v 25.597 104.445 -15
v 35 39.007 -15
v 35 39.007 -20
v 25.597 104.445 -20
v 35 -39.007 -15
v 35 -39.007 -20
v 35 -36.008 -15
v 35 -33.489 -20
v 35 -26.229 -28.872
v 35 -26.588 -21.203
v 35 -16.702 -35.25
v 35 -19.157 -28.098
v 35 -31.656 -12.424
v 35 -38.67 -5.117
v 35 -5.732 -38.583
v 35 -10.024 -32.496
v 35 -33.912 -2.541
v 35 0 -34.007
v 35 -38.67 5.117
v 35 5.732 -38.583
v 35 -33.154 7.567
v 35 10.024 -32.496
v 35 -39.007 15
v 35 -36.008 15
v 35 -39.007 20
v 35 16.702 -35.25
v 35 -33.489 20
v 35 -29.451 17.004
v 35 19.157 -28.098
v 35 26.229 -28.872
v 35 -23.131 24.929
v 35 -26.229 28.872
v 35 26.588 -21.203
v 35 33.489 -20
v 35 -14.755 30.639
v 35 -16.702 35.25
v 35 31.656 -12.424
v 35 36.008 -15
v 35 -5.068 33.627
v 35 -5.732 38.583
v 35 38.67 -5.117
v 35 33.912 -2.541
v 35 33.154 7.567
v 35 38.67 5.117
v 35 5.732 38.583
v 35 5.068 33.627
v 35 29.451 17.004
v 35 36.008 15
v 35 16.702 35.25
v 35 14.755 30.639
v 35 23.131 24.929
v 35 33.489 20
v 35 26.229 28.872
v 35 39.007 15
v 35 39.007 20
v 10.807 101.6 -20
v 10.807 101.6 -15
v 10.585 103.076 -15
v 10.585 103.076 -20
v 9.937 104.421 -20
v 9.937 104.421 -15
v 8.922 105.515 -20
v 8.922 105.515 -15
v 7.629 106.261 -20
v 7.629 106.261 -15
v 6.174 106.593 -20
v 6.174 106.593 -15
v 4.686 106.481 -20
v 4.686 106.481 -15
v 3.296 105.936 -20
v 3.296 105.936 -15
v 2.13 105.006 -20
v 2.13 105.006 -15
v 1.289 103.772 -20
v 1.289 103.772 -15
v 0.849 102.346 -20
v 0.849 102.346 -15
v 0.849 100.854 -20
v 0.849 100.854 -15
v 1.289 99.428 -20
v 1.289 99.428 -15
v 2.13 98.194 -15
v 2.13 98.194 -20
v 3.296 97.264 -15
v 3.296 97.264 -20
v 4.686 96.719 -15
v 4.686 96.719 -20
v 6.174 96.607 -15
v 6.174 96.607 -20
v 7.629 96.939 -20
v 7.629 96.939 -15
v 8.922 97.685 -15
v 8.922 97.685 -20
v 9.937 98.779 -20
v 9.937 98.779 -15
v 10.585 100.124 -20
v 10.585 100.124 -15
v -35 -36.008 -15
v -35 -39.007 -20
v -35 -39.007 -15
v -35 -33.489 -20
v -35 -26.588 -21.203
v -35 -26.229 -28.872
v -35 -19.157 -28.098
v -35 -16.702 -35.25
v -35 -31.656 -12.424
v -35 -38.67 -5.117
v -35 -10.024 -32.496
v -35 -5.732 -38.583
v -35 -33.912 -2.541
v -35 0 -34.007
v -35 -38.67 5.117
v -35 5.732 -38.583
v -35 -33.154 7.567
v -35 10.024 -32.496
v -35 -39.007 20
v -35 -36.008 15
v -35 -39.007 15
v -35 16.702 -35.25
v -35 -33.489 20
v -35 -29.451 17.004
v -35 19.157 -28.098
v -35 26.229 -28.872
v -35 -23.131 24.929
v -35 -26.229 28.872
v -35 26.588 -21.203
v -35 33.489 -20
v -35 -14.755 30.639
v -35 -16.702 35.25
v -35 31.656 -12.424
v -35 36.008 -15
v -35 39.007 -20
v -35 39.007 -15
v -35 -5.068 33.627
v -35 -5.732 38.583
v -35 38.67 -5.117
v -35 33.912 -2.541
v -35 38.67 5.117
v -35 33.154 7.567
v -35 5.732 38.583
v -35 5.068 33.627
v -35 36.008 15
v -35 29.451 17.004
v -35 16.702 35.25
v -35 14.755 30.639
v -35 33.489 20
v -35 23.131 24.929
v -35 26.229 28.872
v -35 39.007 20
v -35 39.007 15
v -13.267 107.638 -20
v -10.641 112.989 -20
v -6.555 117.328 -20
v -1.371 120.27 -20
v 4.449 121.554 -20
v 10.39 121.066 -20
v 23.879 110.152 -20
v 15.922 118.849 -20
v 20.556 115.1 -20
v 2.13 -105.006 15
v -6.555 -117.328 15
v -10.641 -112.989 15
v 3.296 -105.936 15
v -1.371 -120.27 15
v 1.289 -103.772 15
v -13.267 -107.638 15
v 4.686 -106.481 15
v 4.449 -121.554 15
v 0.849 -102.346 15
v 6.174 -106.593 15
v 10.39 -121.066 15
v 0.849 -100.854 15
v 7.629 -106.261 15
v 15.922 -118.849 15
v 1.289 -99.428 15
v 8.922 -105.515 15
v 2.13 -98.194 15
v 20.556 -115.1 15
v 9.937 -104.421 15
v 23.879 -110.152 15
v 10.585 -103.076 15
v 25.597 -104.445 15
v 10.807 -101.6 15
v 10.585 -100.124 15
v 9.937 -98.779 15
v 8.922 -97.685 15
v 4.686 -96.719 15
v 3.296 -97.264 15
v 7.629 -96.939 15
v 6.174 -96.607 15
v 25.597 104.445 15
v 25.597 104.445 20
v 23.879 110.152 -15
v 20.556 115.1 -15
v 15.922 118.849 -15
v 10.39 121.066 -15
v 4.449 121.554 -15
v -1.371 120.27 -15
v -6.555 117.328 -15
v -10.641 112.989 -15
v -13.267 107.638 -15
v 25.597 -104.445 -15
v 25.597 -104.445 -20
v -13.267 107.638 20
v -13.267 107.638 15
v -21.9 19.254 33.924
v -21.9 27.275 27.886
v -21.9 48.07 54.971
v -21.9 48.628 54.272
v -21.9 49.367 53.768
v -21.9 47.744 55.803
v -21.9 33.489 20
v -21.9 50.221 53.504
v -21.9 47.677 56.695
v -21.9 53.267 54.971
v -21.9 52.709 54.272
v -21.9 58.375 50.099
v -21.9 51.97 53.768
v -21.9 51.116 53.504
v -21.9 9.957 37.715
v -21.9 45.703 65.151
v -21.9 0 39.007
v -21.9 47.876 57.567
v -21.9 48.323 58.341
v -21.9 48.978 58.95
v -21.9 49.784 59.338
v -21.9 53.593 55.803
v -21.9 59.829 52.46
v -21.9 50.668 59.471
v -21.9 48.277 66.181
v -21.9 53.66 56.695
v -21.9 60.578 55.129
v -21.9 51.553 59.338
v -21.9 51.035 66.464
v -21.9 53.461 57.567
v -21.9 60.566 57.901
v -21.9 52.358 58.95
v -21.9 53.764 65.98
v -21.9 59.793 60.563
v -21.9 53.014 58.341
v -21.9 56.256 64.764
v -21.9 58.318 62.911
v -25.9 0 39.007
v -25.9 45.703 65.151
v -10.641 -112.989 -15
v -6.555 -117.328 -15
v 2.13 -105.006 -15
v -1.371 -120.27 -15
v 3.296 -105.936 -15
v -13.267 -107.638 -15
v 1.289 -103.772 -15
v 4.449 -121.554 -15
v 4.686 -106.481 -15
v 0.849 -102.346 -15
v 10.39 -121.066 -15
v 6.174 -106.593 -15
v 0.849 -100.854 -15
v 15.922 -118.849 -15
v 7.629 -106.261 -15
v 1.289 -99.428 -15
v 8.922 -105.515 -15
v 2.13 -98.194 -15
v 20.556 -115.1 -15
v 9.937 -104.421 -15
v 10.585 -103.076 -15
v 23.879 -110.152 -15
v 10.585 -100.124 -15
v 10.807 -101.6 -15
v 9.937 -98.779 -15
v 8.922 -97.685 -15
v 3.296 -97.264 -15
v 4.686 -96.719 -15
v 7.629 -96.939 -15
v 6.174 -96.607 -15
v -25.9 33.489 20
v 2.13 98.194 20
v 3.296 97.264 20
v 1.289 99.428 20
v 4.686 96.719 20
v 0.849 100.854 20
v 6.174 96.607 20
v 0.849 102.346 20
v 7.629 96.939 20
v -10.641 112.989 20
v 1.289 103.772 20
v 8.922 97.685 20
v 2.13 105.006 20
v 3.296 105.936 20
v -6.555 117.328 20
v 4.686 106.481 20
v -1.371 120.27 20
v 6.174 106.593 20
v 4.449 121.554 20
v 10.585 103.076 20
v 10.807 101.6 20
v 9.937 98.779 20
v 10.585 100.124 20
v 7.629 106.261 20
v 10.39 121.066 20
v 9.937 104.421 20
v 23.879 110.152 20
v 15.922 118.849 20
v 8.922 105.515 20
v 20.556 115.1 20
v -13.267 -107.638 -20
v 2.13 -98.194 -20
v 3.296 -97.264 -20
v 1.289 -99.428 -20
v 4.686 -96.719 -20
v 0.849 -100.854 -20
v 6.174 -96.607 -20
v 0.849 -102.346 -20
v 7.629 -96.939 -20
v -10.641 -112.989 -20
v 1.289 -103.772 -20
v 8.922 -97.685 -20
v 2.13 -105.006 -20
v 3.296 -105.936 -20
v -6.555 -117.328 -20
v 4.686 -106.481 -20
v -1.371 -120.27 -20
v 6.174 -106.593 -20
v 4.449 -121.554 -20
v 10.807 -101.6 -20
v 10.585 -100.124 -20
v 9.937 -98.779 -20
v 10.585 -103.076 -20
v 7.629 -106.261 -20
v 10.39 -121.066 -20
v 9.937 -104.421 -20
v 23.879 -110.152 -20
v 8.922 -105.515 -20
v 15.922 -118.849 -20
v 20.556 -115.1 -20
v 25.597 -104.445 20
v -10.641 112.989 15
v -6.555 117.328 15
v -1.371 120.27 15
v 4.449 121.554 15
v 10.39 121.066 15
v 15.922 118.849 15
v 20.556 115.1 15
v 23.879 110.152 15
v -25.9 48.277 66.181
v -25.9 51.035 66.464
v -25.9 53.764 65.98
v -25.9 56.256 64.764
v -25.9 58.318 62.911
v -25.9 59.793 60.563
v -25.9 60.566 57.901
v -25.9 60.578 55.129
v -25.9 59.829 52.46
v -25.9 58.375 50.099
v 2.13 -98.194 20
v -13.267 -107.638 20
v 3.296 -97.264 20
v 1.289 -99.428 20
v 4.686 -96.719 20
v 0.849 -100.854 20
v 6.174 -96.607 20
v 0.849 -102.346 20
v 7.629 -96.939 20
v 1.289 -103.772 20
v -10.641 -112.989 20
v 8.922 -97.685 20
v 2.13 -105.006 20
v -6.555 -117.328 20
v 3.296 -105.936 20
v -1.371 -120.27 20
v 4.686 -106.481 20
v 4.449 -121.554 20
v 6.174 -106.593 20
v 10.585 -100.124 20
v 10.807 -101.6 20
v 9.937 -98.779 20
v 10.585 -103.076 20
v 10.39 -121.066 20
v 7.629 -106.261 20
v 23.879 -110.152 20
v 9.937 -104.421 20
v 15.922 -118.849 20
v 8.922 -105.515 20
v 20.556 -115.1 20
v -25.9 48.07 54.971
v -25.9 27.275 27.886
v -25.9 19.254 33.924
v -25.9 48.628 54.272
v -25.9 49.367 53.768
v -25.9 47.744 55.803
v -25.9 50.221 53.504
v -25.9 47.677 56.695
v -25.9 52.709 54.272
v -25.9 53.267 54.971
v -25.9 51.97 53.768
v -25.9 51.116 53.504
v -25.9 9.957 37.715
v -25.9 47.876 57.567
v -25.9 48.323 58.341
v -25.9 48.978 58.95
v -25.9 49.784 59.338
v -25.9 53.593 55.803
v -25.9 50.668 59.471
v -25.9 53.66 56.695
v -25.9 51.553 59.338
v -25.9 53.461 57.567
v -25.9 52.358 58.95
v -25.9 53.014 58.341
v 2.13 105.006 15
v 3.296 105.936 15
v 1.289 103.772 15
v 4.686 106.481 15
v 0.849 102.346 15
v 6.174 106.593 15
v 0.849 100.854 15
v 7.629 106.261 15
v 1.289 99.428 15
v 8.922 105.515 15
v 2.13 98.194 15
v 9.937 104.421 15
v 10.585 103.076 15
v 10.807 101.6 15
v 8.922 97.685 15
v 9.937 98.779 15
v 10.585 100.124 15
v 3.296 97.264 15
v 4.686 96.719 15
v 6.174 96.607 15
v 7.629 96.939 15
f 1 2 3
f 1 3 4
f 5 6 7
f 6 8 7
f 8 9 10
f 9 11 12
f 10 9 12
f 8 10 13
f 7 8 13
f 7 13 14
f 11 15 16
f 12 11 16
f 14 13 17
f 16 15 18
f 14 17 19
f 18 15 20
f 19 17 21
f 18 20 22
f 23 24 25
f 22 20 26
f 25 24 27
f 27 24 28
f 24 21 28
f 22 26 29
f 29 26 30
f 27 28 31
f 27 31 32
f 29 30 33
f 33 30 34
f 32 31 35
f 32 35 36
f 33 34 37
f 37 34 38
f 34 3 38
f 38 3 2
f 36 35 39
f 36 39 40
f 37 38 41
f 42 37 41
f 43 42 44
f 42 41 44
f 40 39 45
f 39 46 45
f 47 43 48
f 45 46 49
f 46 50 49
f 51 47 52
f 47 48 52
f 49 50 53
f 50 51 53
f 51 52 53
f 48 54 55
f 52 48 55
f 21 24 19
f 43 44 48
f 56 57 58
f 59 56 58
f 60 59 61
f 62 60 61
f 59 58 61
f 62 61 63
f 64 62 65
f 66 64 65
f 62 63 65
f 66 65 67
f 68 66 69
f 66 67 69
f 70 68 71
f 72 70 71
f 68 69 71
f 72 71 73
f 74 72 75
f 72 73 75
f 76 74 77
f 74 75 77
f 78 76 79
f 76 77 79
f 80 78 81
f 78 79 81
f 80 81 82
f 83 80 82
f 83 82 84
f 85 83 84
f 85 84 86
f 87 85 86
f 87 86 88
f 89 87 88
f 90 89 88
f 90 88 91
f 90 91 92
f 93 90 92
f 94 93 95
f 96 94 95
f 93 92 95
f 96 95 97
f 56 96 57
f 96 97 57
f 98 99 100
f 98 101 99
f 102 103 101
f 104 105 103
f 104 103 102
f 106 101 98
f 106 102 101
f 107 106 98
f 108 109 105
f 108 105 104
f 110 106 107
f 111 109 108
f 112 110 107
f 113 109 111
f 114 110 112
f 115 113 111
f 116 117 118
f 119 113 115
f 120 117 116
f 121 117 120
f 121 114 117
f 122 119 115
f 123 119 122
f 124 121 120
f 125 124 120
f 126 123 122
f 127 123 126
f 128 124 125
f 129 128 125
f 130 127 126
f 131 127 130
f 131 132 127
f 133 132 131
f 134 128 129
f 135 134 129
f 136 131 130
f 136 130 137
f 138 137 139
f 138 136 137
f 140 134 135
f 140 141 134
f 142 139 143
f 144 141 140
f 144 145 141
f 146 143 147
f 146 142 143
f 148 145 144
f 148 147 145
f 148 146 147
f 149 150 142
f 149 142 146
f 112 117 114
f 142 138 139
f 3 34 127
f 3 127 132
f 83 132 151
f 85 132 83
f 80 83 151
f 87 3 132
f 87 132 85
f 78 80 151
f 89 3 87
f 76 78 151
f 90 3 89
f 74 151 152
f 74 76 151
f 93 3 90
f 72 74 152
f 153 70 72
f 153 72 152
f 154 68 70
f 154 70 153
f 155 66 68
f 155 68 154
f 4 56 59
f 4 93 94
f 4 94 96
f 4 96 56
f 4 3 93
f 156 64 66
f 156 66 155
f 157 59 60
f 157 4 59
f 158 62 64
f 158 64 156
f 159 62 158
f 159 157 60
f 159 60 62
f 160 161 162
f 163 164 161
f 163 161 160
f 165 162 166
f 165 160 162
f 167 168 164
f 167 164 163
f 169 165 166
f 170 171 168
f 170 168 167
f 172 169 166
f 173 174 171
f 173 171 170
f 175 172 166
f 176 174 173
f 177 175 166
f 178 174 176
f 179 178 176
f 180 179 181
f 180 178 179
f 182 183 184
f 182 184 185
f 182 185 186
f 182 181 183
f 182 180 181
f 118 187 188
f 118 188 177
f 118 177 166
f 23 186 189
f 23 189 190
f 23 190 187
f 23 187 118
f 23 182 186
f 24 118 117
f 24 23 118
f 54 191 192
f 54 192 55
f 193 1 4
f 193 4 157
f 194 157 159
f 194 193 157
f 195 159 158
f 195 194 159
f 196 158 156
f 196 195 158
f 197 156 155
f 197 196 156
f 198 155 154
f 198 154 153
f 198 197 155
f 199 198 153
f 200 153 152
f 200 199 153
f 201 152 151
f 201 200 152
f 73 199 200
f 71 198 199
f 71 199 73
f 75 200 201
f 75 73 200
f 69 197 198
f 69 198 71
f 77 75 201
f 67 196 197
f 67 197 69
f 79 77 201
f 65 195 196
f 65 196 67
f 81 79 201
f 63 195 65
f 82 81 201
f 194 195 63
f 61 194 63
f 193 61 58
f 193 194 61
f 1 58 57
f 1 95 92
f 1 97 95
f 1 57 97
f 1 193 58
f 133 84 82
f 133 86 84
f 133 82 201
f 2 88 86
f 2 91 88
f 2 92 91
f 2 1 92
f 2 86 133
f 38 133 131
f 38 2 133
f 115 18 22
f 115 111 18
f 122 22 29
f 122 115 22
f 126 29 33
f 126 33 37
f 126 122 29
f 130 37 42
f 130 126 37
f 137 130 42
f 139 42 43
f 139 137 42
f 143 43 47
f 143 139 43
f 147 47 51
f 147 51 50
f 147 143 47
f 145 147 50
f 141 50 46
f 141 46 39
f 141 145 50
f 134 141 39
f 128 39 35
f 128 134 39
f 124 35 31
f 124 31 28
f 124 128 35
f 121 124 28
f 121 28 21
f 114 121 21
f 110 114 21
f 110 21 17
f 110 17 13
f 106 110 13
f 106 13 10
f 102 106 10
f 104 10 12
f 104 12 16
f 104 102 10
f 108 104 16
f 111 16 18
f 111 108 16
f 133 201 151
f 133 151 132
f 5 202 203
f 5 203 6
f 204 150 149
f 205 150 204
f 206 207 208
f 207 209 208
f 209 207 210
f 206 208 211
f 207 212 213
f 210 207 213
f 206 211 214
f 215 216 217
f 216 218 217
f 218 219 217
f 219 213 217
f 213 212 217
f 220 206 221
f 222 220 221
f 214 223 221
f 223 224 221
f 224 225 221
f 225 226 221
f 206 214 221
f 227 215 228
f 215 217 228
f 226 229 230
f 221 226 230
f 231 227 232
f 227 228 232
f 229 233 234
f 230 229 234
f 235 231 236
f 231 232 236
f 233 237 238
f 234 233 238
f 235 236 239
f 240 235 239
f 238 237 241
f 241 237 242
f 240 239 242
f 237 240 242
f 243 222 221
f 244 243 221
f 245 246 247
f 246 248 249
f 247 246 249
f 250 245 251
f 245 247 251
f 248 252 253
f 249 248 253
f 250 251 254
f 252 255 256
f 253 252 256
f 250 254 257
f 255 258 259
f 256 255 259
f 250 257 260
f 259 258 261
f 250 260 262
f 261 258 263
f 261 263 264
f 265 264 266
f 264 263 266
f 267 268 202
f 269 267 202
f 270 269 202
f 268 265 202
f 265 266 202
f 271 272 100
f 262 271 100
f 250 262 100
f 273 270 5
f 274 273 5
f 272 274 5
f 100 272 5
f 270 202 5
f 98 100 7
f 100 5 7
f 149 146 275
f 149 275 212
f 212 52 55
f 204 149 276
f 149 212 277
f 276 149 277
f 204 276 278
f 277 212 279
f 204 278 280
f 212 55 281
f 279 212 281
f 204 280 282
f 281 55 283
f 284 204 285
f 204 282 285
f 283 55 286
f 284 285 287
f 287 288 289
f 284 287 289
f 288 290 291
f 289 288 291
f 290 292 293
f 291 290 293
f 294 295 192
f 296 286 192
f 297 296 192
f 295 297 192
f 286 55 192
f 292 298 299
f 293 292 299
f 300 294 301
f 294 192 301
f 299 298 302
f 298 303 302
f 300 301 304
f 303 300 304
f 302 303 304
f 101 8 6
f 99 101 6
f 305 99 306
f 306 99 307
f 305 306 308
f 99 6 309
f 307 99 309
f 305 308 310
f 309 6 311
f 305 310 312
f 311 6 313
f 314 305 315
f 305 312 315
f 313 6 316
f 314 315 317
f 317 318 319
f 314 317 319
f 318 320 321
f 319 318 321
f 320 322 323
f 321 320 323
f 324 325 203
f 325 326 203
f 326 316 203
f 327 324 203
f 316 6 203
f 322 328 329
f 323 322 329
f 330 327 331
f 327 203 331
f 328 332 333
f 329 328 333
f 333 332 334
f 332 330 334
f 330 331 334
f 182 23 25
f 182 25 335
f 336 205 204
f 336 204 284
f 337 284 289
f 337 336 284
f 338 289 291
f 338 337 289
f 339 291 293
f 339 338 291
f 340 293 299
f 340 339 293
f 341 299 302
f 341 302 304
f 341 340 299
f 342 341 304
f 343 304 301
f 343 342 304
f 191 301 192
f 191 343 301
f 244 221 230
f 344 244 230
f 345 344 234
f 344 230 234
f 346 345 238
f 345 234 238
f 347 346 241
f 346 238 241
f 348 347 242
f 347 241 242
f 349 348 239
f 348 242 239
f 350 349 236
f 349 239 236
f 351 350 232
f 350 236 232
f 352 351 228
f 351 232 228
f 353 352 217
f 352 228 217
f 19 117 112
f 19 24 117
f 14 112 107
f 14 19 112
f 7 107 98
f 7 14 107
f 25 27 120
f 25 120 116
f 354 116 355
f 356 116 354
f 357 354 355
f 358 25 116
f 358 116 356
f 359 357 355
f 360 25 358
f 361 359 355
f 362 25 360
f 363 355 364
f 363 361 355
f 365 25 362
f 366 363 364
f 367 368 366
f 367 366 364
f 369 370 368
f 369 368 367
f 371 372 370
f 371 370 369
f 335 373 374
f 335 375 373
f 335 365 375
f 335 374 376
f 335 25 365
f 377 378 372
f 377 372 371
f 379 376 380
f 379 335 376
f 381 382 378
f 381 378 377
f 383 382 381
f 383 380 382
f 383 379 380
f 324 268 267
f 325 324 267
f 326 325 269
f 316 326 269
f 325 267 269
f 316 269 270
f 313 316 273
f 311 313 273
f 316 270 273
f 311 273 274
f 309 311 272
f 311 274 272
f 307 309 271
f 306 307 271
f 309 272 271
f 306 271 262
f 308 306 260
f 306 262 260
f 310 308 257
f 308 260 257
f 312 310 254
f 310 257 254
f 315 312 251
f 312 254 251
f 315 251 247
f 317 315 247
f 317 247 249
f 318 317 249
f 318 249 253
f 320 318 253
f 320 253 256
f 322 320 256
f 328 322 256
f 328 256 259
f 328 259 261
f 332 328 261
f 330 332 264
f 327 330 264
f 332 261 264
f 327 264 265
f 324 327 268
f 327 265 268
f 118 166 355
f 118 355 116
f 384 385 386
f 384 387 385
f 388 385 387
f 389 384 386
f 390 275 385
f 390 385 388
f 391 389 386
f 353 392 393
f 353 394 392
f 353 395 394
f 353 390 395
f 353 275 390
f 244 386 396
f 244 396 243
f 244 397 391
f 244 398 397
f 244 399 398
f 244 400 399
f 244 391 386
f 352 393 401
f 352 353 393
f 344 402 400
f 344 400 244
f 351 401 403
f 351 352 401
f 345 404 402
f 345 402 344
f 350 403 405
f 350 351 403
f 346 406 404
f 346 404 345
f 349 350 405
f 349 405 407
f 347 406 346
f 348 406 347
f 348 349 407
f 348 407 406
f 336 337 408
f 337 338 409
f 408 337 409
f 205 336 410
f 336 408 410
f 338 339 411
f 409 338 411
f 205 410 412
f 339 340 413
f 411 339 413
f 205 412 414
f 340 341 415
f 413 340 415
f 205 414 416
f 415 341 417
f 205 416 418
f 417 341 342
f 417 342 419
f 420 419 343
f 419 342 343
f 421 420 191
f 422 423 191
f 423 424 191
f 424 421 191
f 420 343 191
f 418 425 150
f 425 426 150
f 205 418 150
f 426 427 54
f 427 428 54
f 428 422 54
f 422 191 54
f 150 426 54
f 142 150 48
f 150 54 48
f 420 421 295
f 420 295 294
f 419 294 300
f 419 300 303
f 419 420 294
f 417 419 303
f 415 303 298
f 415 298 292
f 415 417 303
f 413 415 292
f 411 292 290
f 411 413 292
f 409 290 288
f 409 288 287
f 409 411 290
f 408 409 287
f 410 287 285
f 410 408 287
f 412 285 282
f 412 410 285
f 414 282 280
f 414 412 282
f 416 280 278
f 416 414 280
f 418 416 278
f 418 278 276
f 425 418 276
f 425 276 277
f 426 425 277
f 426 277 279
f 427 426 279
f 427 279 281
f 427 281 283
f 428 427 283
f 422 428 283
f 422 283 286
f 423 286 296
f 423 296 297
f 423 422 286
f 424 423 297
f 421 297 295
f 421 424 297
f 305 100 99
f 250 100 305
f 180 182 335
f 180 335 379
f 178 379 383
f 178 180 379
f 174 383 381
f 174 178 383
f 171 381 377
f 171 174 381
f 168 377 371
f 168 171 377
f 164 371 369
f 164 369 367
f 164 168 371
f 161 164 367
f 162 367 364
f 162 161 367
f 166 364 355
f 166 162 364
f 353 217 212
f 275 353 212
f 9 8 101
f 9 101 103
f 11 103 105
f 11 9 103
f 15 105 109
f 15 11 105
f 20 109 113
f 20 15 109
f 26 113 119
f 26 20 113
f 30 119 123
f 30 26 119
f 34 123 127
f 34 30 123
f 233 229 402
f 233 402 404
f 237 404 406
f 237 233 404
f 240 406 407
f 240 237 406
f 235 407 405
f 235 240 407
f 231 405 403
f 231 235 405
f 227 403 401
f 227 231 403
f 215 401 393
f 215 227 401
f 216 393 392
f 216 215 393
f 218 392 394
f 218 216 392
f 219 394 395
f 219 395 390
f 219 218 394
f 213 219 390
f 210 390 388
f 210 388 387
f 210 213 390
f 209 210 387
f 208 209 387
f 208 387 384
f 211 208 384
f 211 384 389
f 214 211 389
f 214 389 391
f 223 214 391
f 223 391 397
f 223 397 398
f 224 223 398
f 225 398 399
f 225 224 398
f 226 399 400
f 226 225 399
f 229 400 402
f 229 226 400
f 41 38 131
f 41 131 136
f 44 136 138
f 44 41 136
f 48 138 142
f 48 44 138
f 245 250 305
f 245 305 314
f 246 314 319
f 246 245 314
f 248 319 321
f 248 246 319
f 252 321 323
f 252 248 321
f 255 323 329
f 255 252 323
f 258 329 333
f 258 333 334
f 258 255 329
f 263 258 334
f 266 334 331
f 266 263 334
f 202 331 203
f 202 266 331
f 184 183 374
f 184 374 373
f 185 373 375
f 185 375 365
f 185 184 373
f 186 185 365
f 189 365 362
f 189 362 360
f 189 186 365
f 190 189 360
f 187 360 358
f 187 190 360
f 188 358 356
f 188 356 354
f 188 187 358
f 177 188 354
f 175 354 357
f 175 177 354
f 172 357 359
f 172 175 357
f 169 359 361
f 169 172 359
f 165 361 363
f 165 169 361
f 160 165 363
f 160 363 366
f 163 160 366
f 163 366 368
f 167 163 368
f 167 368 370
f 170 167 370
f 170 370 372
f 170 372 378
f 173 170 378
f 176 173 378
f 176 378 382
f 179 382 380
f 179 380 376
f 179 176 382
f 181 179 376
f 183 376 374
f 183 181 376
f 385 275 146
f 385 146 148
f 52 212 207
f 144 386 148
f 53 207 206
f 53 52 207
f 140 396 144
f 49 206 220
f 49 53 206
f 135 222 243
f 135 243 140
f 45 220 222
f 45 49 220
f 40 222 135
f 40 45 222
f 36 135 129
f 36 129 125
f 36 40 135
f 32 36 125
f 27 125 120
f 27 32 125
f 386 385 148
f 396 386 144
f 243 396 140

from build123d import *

# Parameters (mm, degrees)
SKETCH1_R             = 39.007
SKETCH1_R_2           = 34.007
BOSS_EXTRUDE1_DEPTH   = 35
BOSS_EXTRUDE2_START   = 15
SKETCH2_R             = 5.007
BOSS_EXTRUDE2_DEPTH   = 5
BOSS_EXTRUDE2_2_DEPTH = 5
BOSS_EXTRUDE3_START   = -15
SKETCH3_R             = 5.007
BOSS_EXTRUDE3_DEPTH   = 5
BOSS_EXTRUDE3_2_DEPTH = 5
BOSS_EXTRUDE4_DEPTH   = 70
BOSS_EXTRUDE5_START   = -4
SKETCH5_R             = 3
BOSS_EXTRUDE5_DEPTH   = 4


with BuildPart() as part:
    # Sketch1 → Boss-Extrude1 (new, symmetric)
    with BuildSketch(Plane(origin=(0, 0, 0), x_dir=(0, 0, -1), z_dir=(1, 0, 0))):
        Circle(SKETCH1_R)
        Circle(SKETCH1_R_2, mode=Mode.SUBTRACT)
    extrude(amount=BOSS_EXTRUDE1_DEPTH, both=True)



with BuildPart() as body_2:
    # Sketch2 → Boss-Extrude2 (new body)
    with BuildSketch(Plane.XY.offset(BOSS_EXTRUDE2_START)):
        with BuildLine():
            Line((-35, -39.007), (35, -39.007))
            Line((35, -39.007), (25.596649495, -104.444761639))
            ThreePointArc((25.596649495, -104.444761639), (7.437713907, -121.532834549), (-13.266839867, -107.637848746))
            Line((-13.266839867, -107.637848746), (-35, -39.007))
        make_face()
        with Locations((5.8, -101.6)):
            Circle(SKETCH2_R, mode=Mode.SUBTRACT)
    extrude(amount=BOSS_EXTRUDE2_DEPTH)


with BuildPart() as body_3:
    # Sketch2 → Boss-Extrude2 2 (new body)
    with BuildSketch(Plane.XY.offset(BOSS_EXTRUDE2_START)):
        with BuildLine():
            Line((35, 39.007), (-35, 39.007))
            Line((-35, 39.007), (-13.266839867, 107.637848746))
            ThreePointArc((-13.266839867, 107.637848746), (7.437713907, 121.532834549), (25.596649495, 104.444761639))
            Line((25.596649495, 104.444761639), (35, 39.007))
        make_face()
        with Locations((5.8, 101.6)):
            Circle(SKETCH2_R, mode=Mode.SUBTRACT)
    extrude(amount=BOSS_EXTRUDE2_2_DEPTH)


with BuildPart() as body_4:
    # Sketch3 → Boss-Extrude3 (new body)
    with BuildSketch(Plane.XY.offset(BOSS_EXTRUDE3_START)):
        with BuildLine():
            Line((-35, -39.007), (-13.266839867, -107.637848746))
            ThreePointArc((-13.266839867, -107.637848746), (7.437713907, -121.532834549), (25.596649495, -104.444761639))
            Line((25.596649495, -104.444761639), (35, -39.007))
            Line((35, -39.007), (-35, -39.007))
        make_face()
        with Locations((5.8, -101.6)):
            Circle(SKETCH3_R, mode=Mode.SUBTRACT)
    extrude(amount=-BOSS_EXTRUDE3_DEPTH)


with BuildPart() as body_5:
    # Sketch3 → Boss-Extrude3 2 (new body)
    with BuildSketch(Plane.XY.offset(BOSS_EXTRUDE3_START)):
        with BuildLine():
            Line((-35, 39.007), (35, 39.007))
            Line((35, 39.007), (25.596649495, 104.444761639))
            ThreePointArc((25.596649495, 104.444761639), (7.437713907, 121.532834549), (-13.266839867, 107.637848746))
            Line((-13.266839867, 107.637848746), (-35, 39.007))
        make_face()
        with Locations((5.8, 101.6)):
            Circle(SKETCH3_R, mode=Mode.SUBTRACT)
    extrude(amount=-BOSS_EXTRUDE3_2_DEPTH)


with BuildPart() as part_1:
    add(part.part)

    add(body_2.part)  # Boss-Extrude4 merges body 2

    add(body_3.part)  # Boss-Extrude4 merges body 3

    add(body_4.part)  # Boss-Extrude4 merges body 4

    add(body_5.part)  # Boss-Extrude4 merges body 5
    # Sketch4 → Boss-Extrude4 (add)
    with BuildSketch(Plane(origin=(35, 0, 0), x_dir=(0, 0, -1), z_dir=(1, 0, 0))):
        with BuildLine():
            Line((20, -39.007), (15, -39.007))
            Line((15, -39.007), (15, -36.007583215))
            ThreePointArc((15, -36.007583215), (17.545232866, -34.838353186), (20, -33.489491621))
            Line((20, -33.489491621), (20, -39.007))
        make_face()
        with BuildLine():
            Line((-20, -39.007), (-15, -39.007))
            Line((-15, -39.007), (-15, -36.007583215))
            ThreePointArc((-15, -36.007583215), (-17.545232866, -34.838353186), (-20, -33.489491621))
            Line((-20, -33.489491621), (-20, -39.007))
        make_face()
        with BuildLine():
            Line((-20, 39.007), (-15, 39.007))
            Line((-15, 39.007), (-15, 36.007583215))
            ThreePointArc((-15, 36.007583215), (-17.545232866, 34.838353186), (-20, 33.489491621))
            Line((-20, 33.489491621), (-20, 39.007))
        make_face()
        with BuildLine():
            Line((20, 39.007), (15, 39.007))
            Line((15, 39.007), (15, 36.007583215))
            ThreePointArc((15, 36.007583215), (17.545232866, 34.838353186), (20, 33.489491621))
            Line((20, 33.489491621), (20, 39.007))
        make_face()
    extrude(amount=-BOSS_EXTRUDE4_DEPTH)

    # Sketch5 → Boss-Extrude5 (add)
    with BuildSketch(Plane.ZY.offset(25.9).offset(BOSS_EXTRUDE5_START)):
        with BuildLine():
            Line((50.098811723, 58.375353815), (20, 33.489491621))
            ThreePointArc((20, 33.489491621), (33.924077357, 19.253649641), (39.007, 0))
            Line((39.007, 0), (65.151054806, 45.703054903))
            ThreePointArc((65.151054806, 45.703054903), (62.911300808, 58.318387785), (50.098811723, 58.375353815))
        make_face()
        with Locations((56.470917013, 50.668455984)):
            Circle(SKETCH5_R, mode=Mode.SUBTRACT)
    extrude(amount=BOSS_EXTRUDE5_DEPTH)


solid = part_1.part
